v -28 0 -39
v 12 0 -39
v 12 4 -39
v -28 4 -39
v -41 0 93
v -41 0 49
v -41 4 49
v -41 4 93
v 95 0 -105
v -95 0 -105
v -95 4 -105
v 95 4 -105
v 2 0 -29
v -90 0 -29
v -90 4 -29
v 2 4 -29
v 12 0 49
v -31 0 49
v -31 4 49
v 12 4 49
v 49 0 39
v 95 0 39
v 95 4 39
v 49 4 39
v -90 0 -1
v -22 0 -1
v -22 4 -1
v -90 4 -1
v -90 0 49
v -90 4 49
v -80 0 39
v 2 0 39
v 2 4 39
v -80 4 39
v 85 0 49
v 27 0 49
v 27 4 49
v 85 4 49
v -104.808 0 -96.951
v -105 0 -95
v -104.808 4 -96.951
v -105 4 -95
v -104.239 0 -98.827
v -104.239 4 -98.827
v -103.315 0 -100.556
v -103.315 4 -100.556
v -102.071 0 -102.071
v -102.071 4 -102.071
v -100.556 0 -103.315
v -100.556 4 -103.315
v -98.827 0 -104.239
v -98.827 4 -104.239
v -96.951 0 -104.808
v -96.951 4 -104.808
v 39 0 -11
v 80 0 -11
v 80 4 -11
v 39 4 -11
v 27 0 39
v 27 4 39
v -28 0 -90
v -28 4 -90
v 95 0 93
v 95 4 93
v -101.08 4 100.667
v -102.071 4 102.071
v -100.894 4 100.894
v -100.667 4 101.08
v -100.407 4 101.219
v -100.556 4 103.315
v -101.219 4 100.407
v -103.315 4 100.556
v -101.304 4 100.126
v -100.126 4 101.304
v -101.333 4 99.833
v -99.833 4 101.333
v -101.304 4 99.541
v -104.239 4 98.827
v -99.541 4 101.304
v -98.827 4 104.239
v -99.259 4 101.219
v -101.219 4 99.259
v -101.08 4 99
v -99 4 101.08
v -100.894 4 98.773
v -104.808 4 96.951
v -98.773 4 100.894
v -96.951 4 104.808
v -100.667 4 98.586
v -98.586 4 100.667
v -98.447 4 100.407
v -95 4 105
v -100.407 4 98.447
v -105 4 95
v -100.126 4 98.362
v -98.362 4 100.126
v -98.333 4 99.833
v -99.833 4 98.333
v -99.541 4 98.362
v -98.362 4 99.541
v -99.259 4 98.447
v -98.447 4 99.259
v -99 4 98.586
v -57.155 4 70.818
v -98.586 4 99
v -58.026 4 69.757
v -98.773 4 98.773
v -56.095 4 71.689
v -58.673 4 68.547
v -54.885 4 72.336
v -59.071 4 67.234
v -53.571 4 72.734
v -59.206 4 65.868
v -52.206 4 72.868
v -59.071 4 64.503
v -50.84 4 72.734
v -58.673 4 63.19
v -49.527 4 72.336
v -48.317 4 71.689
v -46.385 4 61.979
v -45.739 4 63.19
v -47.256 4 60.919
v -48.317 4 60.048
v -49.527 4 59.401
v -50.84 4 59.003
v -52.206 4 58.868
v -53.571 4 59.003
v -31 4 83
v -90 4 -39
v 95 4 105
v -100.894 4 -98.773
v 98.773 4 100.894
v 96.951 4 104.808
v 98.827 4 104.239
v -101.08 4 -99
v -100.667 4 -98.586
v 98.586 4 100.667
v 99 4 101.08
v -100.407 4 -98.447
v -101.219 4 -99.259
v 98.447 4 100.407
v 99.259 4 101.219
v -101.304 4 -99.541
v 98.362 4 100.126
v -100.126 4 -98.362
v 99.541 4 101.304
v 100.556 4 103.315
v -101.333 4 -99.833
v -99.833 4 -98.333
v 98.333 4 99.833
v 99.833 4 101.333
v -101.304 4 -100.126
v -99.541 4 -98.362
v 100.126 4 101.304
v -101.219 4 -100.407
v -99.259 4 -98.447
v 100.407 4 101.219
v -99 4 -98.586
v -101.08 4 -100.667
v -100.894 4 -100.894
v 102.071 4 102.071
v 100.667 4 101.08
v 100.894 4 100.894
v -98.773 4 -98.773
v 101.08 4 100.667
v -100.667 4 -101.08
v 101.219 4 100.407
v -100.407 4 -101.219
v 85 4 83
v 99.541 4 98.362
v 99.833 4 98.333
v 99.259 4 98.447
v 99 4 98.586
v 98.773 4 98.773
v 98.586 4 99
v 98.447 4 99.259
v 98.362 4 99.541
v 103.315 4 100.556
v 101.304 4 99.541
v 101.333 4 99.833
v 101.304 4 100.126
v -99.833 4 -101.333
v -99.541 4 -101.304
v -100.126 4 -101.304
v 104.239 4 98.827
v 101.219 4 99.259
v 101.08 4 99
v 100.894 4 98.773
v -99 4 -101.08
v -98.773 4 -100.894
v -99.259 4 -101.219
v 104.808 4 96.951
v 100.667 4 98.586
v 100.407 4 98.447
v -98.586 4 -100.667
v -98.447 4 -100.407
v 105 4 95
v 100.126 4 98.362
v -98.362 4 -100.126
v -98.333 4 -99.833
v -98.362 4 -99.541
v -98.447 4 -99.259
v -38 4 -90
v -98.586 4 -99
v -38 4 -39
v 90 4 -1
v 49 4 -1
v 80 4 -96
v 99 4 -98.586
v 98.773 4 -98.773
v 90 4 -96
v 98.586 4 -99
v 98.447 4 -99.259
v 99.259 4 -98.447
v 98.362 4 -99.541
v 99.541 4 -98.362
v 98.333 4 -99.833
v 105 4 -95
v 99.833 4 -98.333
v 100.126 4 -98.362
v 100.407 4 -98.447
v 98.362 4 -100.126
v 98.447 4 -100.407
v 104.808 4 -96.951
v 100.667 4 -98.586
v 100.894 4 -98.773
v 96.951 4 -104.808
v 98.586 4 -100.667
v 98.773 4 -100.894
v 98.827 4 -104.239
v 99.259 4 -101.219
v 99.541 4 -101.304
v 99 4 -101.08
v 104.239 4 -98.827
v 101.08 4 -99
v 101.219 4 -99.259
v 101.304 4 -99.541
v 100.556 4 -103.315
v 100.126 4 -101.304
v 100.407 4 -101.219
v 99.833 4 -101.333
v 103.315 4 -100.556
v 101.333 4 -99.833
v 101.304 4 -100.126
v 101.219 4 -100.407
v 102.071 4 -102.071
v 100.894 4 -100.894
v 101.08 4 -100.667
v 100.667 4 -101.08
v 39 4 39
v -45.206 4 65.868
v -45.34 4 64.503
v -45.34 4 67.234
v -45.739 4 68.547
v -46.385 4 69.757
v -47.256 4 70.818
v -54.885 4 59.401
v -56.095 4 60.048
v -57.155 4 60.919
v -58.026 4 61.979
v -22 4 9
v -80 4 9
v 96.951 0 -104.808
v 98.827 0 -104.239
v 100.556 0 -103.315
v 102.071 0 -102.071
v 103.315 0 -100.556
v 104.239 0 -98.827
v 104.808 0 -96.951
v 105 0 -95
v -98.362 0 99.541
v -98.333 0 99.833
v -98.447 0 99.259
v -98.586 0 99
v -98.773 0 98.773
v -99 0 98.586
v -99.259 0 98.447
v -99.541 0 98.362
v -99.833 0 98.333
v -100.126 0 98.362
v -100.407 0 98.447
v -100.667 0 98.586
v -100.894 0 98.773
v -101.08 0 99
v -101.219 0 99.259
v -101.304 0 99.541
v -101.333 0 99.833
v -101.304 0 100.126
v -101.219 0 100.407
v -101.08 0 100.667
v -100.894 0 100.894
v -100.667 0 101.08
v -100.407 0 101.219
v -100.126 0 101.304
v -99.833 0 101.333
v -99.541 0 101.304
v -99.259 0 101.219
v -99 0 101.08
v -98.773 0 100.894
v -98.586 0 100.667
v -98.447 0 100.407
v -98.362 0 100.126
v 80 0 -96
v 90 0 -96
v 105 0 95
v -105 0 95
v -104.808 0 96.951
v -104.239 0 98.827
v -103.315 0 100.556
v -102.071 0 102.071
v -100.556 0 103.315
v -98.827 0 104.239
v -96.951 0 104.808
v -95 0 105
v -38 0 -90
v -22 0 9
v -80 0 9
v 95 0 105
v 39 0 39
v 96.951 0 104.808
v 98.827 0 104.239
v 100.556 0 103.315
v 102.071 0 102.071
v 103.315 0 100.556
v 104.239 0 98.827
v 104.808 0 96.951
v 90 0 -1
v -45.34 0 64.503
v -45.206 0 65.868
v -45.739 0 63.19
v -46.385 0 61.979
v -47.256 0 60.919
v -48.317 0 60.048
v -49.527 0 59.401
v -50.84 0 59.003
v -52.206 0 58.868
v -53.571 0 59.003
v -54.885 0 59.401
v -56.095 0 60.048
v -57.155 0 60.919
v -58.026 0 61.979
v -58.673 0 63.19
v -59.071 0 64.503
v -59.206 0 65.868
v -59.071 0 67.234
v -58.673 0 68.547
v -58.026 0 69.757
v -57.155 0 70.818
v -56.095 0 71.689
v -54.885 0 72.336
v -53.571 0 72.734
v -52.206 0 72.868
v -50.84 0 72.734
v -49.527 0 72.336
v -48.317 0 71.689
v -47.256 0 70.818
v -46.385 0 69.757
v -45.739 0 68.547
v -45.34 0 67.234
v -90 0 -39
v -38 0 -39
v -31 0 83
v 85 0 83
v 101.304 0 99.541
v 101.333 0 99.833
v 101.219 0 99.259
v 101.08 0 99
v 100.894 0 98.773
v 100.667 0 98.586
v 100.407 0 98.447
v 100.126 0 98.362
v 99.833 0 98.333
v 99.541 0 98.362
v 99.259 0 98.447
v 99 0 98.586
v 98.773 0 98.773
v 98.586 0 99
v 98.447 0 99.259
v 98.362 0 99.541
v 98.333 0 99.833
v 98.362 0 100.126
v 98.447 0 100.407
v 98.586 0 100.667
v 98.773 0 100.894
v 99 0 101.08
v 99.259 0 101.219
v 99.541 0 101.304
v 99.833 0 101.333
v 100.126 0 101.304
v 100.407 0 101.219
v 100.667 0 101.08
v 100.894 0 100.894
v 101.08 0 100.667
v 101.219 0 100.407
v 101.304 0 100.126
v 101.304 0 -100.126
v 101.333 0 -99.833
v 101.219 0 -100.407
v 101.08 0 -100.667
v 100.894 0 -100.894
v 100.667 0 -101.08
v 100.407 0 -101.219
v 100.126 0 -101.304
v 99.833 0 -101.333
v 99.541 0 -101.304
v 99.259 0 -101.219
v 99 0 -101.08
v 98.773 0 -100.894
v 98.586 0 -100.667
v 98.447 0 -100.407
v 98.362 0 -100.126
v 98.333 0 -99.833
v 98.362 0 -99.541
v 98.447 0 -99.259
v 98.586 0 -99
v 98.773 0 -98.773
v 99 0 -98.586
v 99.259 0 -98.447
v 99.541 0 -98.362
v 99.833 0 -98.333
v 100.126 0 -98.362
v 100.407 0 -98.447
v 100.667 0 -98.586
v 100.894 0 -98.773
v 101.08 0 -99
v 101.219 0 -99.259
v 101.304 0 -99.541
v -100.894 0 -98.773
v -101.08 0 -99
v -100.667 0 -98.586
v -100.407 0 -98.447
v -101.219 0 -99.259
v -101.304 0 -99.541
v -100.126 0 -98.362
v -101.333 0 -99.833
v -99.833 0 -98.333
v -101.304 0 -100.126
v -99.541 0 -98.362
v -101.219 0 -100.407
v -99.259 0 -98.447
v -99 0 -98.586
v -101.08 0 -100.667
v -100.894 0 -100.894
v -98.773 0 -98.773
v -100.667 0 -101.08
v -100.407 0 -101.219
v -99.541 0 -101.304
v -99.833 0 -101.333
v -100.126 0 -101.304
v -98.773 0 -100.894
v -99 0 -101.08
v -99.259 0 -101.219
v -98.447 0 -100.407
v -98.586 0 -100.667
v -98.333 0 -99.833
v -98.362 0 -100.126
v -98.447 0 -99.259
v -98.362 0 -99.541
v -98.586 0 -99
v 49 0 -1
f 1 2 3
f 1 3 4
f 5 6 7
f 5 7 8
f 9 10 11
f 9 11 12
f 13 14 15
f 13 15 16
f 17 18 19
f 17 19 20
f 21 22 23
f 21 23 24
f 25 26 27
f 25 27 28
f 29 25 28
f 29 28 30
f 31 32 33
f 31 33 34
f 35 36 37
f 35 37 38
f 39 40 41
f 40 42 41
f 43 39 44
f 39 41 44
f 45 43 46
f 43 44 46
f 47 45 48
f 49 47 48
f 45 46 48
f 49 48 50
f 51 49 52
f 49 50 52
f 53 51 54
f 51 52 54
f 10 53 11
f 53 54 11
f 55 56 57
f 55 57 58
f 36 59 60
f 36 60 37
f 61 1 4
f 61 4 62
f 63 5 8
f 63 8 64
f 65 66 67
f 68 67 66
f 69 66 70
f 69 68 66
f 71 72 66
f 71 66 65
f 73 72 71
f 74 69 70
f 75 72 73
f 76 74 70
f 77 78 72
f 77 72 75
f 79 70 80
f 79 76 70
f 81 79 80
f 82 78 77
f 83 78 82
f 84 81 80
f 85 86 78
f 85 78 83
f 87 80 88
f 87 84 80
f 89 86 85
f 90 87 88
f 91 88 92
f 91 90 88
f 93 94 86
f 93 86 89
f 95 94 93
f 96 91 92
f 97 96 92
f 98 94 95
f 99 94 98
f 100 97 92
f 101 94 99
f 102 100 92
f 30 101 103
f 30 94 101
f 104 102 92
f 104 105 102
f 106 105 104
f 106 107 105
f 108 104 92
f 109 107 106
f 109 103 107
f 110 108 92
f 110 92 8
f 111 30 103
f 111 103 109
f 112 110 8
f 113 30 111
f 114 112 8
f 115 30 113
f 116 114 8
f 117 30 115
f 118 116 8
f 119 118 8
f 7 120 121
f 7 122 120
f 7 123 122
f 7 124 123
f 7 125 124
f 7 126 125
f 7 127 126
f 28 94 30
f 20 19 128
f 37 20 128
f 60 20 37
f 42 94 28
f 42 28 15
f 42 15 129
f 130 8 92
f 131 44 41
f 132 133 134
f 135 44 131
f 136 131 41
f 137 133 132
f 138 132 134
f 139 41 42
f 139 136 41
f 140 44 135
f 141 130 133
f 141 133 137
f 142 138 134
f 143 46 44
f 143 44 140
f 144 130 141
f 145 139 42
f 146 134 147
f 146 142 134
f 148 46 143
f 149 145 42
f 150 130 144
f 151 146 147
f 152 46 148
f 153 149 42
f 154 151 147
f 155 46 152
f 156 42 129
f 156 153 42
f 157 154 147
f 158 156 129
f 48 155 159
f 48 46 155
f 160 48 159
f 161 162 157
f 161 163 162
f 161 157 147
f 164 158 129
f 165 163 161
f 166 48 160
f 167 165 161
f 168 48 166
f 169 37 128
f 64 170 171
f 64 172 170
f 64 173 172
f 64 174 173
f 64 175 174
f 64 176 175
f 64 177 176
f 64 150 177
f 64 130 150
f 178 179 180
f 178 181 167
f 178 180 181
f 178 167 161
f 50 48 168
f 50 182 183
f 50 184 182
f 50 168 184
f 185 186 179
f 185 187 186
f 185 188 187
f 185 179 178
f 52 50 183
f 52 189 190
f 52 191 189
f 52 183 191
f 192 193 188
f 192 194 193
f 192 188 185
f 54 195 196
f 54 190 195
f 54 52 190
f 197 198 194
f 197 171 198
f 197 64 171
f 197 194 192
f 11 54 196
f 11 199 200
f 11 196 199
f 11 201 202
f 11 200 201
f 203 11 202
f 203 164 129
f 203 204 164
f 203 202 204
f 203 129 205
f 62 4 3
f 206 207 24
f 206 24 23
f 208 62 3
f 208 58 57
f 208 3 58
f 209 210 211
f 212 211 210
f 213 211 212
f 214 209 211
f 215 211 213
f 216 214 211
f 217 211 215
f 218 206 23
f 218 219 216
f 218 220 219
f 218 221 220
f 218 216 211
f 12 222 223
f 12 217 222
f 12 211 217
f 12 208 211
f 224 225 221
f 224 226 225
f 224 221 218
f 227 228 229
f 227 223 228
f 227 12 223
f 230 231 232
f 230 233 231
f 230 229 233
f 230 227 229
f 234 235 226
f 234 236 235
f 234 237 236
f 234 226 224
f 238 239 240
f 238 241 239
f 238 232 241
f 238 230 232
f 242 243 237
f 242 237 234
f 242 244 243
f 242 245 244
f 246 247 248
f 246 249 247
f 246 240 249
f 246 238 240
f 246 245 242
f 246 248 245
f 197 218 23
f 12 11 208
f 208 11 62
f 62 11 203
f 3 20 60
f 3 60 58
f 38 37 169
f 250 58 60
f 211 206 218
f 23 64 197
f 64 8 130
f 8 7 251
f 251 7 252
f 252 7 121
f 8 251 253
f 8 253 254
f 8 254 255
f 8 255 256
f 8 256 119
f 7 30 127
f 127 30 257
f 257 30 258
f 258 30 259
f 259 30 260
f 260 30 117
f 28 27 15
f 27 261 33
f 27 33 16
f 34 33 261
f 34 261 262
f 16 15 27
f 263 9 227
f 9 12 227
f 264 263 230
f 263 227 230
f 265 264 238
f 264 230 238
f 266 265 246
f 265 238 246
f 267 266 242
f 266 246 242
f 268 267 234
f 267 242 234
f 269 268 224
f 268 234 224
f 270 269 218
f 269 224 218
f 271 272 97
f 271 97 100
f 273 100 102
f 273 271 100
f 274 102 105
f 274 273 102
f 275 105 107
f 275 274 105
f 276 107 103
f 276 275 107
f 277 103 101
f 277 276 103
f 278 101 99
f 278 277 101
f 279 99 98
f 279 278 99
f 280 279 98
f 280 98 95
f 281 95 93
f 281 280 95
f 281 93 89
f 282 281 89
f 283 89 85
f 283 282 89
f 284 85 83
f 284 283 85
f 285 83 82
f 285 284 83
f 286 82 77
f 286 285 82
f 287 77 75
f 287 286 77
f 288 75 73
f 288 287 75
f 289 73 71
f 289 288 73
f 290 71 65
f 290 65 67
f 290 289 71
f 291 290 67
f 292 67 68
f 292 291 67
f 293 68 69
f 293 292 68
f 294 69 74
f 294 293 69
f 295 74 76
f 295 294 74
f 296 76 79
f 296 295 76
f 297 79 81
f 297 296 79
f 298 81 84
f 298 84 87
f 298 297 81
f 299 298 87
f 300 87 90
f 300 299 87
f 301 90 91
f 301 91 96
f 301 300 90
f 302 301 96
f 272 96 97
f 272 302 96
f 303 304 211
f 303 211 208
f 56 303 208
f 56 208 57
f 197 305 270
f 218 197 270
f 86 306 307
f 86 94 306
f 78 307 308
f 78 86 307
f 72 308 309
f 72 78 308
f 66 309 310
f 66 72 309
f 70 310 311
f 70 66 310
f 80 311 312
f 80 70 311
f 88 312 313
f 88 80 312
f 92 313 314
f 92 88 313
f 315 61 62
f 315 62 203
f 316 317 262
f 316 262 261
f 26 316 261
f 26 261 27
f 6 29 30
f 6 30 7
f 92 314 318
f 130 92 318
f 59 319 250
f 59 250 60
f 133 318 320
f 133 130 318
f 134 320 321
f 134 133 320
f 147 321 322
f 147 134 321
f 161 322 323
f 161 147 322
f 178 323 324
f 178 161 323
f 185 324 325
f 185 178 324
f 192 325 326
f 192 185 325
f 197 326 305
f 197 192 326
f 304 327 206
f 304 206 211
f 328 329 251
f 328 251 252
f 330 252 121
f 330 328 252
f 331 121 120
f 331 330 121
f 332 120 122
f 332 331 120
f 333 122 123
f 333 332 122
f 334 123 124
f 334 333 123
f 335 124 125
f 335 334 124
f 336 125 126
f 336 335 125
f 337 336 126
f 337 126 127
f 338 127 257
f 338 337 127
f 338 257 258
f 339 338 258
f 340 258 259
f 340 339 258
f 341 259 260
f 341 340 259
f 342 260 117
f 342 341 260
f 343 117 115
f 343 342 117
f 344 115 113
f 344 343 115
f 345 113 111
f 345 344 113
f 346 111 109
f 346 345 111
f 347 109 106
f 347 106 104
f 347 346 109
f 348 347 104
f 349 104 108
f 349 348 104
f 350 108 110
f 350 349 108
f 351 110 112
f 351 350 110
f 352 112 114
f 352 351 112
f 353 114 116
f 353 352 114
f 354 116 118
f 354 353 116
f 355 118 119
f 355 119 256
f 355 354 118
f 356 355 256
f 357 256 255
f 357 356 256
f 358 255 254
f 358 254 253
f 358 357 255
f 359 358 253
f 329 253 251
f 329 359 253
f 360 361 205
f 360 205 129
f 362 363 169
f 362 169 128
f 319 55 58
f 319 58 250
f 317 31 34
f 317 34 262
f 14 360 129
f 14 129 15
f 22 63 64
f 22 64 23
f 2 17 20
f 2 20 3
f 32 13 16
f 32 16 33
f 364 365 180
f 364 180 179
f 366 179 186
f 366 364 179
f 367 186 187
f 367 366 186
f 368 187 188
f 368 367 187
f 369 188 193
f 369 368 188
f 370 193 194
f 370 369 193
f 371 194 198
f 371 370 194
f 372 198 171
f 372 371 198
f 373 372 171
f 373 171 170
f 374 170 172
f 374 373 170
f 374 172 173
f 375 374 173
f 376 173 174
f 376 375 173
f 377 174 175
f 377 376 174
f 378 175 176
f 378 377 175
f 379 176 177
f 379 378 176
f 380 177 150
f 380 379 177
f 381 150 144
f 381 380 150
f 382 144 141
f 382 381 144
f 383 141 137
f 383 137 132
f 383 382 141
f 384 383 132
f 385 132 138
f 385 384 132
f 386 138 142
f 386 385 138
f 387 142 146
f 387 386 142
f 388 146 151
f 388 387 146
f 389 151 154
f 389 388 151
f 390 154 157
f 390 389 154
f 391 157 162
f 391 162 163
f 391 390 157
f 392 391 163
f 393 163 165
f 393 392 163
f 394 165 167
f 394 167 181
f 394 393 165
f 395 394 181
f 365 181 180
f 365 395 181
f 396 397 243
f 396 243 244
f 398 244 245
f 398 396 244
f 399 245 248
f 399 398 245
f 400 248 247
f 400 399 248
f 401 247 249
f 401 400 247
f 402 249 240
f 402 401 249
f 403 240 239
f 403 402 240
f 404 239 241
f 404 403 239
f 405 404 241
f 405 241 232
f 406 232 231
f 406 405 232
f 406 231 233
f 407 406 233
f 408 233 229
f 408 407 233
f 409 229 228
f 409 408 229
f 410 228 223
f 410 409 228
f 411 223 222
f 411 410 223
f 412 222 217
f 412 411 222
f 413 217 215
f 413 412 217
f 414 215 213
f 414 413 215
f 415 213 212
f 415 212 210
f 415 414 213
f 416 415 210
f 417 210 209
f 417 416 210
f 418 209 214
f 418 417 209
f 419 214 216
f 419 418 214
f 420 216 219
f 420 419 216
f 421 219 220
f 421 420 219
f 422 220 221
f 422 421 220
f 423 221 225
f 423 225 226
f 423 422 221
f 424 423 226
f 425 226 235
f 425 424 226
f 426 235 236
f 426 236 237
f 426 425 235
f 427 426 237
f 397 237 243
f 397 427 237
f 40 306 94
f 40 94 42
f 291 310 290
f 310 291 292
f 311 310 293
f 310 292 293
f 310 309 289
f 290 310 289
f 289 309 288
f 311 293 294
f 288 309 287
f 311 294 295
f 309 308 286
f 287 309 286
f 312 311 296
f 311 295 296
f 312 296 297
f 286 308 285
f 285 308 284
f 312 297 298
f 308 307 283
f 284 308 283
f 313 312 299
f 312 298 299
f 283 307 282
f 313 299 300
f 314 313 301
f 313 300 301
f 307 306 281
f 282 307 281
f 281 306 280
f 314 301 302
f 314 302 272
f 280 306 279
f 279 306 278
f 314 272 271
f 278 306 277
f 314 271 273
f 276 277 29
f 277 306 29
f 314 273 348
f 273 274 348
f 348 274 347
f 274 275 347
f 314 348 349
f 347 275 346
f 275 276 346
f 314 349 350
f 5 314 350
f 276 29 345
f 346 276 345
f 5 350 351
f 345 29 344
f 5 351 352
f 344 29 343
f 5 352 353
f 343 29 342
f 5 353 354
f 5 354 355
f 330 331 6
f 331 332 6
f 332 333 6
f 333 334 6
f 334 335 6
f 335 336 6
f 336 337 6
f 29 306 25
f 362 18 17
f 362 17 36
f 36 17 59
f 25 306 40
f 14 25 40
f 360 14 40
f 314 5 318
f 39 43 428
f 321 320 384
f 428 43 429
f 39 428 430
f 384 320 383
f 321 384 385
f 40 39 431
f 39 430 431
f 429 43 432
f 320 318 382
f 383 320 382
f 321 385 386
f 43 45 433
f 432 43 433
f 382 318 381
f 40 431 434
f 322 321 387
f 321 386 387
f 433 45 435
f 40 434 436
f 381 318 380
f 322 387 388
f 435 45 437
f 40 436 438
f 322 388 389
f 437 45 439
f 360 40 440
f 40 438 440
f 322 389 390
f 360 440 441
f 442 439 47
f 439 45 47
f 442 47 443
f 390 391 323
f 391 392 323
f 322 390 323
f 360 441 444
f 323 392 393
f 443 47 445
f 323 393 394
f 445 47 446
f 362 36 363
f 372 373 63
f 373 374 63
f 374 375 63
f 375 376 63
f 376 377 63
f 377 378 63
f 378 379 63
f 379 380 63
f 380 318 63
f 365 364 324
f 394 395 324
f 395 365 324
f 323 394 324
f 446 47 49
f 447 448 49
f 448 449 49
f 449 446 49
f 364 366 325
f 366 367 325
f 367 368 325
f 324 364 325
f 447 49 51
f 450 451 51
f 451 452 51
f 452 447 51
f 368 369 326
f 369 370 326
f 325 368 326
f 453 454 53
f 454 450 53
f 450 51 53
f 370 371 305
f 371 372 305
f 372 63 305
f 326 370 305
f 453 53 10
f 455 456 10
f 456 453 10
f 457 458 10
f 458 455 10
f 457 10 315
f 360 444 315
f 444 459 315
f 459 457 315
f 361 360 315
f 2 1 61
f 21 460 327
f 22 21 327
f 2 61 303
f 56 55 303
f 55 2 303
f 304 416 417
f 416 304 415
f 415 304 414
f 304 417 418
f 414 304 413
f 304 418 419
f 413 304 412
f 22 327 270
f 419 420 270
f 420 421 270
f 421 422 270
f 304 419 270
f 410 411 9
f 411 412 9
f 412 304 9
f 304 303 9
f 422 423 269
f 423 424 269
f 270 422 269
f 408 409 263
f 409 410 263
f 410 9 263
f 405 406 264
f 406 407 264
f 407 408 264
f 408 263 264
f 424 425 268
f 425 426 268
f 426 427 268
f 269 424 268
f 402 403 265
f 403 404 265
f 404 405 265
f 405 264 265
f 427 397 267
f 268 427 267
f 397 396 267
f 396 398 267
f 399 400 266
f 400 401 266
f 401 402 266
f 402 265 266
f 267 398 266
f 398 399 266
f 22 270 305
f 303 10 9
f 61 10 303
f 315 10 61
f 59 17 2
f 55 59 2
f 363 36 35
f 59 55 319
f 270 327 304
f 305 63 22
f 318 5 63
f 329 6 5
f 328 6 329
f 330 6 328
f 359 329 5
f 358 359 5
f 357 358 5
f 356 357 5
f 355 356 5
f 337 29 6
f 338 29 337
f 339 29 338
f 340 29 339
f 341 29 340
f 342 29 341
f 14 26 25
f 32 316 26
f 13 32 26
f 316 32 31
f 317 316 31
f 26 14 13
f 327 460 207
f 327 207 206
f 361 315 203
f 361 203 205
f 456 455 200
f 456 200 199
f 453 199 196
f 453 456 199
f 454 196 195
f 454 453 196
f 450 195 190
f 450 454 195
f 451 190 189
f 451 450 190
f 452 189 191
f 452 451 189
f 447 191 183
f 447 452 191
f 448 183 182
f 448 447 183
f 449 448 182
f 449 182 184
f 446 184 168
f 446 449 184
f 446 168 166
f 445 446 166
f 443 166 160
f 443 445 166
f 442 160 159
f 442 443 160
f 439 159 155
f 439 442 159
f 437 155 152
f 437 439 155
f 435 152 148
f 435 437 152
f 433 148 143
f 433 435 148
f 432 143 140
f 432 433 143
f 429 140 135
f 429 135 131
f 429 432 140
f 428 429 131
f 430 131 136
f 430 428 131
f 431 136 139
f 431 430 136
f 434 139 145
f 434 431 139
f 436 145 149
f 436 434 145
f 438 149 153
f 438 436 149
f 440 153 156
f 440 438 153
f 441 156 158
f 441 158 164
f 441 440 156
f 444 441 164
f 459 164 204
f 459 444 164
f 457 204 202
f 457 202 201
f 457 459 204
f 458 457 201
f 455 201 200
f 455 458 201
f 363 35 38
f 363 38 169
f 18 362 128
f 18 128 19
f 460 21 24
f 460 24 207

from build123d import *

# Parameters (mm, degrees)
SKETCH1_W         = 210
SKETCH1_H         = 210
MAINEXTRUDE_DEPTH = 4
SKETCH1_6_R       = 1.5
SCREWHOLES_DEPTH  = 4
ROUNDEDCORNERS_R  = 10
SKETCH3_R         = 7
TRENCH_DEPTH      = 4


with BuildPart() as part:
    # Sketch1 → MainExtrude (new body)
    with BuildSketch(Plane(origin=(0, 0, 0), x_dir=(1, 0, 0), z_dir=(0, 1, 0))):
        Rectangle(SKETCH1_W, SKETCH1_H)
    extrude(amount=MAINEXTRUDE_DEPTH)

    # Sketch1<6> → ScrewHoles (cut)
    with BuildSketch(Plane(origin=(0, 0, 0), x_dir=(1, 0, 0), z_dir=(0, 1, 0))):
        with Locations((-99.833273811, 99.833273811)):
            Circle(SKETCH1_6_R)
        with Locations((-99.833273811, -99.833273811)):
            Circle(SKETCH1_6_R)
        with Locations((99.833273811, -99.833273811)):
            Circle(SKETCH1_6_R)
        with Locations((99.833273811, 99.833273811)):
            Circle(SKETCH1_6_R)
    extrude(amount=SCREWHOLES_DEPTH, mode=Mode.SUBTRACT)

    # RoundedCorners
    roundedcorners_edges = [part.edges().sort_by_distance(p)[0] for p in [
        (-105, 2, -105),
        (-105, 2, 105),
        (105, 2, 105),
        (105, 2, -105),
    ]]
    fillet(roundedcorners_edges, radius=ROUNDEDCORNERS_R)

    # Sketch3 → Trench (cut)
    with BuildSketch(Plane(origin=(0, 0, 0), x_dir=(1, 0, 0), z_dir=(0, 1, 0))):
        with Locations((-52.205723714, -65.868416485)):
            Circle(SKETCH3_R)
        Polygon((-38, 90), (-38, 39), (-90, 39), (-90, 29), (2, 29), (2, -39), (-80, -39), (-80, -9), (-22, -9), (-22, 1), (-90, 1), (-90, -49), (-41, -49), (-41, -93), (95, -93), (95, -39), (49, -39), (49, 1), (90, 1), (90, 96), (80, 96), (80, 11), (39, 11), (39, -39), (27, -39), (27, -49), (85, -49), (85, -83), (-31, -83), (-31, -49), (12, -49), (12, 39), (-28, 39), (-28, 90), align=None)
    extrude(amount=TRENCH_DEPTH, mode=Mode.SUBTRACT)


solid = part.part
